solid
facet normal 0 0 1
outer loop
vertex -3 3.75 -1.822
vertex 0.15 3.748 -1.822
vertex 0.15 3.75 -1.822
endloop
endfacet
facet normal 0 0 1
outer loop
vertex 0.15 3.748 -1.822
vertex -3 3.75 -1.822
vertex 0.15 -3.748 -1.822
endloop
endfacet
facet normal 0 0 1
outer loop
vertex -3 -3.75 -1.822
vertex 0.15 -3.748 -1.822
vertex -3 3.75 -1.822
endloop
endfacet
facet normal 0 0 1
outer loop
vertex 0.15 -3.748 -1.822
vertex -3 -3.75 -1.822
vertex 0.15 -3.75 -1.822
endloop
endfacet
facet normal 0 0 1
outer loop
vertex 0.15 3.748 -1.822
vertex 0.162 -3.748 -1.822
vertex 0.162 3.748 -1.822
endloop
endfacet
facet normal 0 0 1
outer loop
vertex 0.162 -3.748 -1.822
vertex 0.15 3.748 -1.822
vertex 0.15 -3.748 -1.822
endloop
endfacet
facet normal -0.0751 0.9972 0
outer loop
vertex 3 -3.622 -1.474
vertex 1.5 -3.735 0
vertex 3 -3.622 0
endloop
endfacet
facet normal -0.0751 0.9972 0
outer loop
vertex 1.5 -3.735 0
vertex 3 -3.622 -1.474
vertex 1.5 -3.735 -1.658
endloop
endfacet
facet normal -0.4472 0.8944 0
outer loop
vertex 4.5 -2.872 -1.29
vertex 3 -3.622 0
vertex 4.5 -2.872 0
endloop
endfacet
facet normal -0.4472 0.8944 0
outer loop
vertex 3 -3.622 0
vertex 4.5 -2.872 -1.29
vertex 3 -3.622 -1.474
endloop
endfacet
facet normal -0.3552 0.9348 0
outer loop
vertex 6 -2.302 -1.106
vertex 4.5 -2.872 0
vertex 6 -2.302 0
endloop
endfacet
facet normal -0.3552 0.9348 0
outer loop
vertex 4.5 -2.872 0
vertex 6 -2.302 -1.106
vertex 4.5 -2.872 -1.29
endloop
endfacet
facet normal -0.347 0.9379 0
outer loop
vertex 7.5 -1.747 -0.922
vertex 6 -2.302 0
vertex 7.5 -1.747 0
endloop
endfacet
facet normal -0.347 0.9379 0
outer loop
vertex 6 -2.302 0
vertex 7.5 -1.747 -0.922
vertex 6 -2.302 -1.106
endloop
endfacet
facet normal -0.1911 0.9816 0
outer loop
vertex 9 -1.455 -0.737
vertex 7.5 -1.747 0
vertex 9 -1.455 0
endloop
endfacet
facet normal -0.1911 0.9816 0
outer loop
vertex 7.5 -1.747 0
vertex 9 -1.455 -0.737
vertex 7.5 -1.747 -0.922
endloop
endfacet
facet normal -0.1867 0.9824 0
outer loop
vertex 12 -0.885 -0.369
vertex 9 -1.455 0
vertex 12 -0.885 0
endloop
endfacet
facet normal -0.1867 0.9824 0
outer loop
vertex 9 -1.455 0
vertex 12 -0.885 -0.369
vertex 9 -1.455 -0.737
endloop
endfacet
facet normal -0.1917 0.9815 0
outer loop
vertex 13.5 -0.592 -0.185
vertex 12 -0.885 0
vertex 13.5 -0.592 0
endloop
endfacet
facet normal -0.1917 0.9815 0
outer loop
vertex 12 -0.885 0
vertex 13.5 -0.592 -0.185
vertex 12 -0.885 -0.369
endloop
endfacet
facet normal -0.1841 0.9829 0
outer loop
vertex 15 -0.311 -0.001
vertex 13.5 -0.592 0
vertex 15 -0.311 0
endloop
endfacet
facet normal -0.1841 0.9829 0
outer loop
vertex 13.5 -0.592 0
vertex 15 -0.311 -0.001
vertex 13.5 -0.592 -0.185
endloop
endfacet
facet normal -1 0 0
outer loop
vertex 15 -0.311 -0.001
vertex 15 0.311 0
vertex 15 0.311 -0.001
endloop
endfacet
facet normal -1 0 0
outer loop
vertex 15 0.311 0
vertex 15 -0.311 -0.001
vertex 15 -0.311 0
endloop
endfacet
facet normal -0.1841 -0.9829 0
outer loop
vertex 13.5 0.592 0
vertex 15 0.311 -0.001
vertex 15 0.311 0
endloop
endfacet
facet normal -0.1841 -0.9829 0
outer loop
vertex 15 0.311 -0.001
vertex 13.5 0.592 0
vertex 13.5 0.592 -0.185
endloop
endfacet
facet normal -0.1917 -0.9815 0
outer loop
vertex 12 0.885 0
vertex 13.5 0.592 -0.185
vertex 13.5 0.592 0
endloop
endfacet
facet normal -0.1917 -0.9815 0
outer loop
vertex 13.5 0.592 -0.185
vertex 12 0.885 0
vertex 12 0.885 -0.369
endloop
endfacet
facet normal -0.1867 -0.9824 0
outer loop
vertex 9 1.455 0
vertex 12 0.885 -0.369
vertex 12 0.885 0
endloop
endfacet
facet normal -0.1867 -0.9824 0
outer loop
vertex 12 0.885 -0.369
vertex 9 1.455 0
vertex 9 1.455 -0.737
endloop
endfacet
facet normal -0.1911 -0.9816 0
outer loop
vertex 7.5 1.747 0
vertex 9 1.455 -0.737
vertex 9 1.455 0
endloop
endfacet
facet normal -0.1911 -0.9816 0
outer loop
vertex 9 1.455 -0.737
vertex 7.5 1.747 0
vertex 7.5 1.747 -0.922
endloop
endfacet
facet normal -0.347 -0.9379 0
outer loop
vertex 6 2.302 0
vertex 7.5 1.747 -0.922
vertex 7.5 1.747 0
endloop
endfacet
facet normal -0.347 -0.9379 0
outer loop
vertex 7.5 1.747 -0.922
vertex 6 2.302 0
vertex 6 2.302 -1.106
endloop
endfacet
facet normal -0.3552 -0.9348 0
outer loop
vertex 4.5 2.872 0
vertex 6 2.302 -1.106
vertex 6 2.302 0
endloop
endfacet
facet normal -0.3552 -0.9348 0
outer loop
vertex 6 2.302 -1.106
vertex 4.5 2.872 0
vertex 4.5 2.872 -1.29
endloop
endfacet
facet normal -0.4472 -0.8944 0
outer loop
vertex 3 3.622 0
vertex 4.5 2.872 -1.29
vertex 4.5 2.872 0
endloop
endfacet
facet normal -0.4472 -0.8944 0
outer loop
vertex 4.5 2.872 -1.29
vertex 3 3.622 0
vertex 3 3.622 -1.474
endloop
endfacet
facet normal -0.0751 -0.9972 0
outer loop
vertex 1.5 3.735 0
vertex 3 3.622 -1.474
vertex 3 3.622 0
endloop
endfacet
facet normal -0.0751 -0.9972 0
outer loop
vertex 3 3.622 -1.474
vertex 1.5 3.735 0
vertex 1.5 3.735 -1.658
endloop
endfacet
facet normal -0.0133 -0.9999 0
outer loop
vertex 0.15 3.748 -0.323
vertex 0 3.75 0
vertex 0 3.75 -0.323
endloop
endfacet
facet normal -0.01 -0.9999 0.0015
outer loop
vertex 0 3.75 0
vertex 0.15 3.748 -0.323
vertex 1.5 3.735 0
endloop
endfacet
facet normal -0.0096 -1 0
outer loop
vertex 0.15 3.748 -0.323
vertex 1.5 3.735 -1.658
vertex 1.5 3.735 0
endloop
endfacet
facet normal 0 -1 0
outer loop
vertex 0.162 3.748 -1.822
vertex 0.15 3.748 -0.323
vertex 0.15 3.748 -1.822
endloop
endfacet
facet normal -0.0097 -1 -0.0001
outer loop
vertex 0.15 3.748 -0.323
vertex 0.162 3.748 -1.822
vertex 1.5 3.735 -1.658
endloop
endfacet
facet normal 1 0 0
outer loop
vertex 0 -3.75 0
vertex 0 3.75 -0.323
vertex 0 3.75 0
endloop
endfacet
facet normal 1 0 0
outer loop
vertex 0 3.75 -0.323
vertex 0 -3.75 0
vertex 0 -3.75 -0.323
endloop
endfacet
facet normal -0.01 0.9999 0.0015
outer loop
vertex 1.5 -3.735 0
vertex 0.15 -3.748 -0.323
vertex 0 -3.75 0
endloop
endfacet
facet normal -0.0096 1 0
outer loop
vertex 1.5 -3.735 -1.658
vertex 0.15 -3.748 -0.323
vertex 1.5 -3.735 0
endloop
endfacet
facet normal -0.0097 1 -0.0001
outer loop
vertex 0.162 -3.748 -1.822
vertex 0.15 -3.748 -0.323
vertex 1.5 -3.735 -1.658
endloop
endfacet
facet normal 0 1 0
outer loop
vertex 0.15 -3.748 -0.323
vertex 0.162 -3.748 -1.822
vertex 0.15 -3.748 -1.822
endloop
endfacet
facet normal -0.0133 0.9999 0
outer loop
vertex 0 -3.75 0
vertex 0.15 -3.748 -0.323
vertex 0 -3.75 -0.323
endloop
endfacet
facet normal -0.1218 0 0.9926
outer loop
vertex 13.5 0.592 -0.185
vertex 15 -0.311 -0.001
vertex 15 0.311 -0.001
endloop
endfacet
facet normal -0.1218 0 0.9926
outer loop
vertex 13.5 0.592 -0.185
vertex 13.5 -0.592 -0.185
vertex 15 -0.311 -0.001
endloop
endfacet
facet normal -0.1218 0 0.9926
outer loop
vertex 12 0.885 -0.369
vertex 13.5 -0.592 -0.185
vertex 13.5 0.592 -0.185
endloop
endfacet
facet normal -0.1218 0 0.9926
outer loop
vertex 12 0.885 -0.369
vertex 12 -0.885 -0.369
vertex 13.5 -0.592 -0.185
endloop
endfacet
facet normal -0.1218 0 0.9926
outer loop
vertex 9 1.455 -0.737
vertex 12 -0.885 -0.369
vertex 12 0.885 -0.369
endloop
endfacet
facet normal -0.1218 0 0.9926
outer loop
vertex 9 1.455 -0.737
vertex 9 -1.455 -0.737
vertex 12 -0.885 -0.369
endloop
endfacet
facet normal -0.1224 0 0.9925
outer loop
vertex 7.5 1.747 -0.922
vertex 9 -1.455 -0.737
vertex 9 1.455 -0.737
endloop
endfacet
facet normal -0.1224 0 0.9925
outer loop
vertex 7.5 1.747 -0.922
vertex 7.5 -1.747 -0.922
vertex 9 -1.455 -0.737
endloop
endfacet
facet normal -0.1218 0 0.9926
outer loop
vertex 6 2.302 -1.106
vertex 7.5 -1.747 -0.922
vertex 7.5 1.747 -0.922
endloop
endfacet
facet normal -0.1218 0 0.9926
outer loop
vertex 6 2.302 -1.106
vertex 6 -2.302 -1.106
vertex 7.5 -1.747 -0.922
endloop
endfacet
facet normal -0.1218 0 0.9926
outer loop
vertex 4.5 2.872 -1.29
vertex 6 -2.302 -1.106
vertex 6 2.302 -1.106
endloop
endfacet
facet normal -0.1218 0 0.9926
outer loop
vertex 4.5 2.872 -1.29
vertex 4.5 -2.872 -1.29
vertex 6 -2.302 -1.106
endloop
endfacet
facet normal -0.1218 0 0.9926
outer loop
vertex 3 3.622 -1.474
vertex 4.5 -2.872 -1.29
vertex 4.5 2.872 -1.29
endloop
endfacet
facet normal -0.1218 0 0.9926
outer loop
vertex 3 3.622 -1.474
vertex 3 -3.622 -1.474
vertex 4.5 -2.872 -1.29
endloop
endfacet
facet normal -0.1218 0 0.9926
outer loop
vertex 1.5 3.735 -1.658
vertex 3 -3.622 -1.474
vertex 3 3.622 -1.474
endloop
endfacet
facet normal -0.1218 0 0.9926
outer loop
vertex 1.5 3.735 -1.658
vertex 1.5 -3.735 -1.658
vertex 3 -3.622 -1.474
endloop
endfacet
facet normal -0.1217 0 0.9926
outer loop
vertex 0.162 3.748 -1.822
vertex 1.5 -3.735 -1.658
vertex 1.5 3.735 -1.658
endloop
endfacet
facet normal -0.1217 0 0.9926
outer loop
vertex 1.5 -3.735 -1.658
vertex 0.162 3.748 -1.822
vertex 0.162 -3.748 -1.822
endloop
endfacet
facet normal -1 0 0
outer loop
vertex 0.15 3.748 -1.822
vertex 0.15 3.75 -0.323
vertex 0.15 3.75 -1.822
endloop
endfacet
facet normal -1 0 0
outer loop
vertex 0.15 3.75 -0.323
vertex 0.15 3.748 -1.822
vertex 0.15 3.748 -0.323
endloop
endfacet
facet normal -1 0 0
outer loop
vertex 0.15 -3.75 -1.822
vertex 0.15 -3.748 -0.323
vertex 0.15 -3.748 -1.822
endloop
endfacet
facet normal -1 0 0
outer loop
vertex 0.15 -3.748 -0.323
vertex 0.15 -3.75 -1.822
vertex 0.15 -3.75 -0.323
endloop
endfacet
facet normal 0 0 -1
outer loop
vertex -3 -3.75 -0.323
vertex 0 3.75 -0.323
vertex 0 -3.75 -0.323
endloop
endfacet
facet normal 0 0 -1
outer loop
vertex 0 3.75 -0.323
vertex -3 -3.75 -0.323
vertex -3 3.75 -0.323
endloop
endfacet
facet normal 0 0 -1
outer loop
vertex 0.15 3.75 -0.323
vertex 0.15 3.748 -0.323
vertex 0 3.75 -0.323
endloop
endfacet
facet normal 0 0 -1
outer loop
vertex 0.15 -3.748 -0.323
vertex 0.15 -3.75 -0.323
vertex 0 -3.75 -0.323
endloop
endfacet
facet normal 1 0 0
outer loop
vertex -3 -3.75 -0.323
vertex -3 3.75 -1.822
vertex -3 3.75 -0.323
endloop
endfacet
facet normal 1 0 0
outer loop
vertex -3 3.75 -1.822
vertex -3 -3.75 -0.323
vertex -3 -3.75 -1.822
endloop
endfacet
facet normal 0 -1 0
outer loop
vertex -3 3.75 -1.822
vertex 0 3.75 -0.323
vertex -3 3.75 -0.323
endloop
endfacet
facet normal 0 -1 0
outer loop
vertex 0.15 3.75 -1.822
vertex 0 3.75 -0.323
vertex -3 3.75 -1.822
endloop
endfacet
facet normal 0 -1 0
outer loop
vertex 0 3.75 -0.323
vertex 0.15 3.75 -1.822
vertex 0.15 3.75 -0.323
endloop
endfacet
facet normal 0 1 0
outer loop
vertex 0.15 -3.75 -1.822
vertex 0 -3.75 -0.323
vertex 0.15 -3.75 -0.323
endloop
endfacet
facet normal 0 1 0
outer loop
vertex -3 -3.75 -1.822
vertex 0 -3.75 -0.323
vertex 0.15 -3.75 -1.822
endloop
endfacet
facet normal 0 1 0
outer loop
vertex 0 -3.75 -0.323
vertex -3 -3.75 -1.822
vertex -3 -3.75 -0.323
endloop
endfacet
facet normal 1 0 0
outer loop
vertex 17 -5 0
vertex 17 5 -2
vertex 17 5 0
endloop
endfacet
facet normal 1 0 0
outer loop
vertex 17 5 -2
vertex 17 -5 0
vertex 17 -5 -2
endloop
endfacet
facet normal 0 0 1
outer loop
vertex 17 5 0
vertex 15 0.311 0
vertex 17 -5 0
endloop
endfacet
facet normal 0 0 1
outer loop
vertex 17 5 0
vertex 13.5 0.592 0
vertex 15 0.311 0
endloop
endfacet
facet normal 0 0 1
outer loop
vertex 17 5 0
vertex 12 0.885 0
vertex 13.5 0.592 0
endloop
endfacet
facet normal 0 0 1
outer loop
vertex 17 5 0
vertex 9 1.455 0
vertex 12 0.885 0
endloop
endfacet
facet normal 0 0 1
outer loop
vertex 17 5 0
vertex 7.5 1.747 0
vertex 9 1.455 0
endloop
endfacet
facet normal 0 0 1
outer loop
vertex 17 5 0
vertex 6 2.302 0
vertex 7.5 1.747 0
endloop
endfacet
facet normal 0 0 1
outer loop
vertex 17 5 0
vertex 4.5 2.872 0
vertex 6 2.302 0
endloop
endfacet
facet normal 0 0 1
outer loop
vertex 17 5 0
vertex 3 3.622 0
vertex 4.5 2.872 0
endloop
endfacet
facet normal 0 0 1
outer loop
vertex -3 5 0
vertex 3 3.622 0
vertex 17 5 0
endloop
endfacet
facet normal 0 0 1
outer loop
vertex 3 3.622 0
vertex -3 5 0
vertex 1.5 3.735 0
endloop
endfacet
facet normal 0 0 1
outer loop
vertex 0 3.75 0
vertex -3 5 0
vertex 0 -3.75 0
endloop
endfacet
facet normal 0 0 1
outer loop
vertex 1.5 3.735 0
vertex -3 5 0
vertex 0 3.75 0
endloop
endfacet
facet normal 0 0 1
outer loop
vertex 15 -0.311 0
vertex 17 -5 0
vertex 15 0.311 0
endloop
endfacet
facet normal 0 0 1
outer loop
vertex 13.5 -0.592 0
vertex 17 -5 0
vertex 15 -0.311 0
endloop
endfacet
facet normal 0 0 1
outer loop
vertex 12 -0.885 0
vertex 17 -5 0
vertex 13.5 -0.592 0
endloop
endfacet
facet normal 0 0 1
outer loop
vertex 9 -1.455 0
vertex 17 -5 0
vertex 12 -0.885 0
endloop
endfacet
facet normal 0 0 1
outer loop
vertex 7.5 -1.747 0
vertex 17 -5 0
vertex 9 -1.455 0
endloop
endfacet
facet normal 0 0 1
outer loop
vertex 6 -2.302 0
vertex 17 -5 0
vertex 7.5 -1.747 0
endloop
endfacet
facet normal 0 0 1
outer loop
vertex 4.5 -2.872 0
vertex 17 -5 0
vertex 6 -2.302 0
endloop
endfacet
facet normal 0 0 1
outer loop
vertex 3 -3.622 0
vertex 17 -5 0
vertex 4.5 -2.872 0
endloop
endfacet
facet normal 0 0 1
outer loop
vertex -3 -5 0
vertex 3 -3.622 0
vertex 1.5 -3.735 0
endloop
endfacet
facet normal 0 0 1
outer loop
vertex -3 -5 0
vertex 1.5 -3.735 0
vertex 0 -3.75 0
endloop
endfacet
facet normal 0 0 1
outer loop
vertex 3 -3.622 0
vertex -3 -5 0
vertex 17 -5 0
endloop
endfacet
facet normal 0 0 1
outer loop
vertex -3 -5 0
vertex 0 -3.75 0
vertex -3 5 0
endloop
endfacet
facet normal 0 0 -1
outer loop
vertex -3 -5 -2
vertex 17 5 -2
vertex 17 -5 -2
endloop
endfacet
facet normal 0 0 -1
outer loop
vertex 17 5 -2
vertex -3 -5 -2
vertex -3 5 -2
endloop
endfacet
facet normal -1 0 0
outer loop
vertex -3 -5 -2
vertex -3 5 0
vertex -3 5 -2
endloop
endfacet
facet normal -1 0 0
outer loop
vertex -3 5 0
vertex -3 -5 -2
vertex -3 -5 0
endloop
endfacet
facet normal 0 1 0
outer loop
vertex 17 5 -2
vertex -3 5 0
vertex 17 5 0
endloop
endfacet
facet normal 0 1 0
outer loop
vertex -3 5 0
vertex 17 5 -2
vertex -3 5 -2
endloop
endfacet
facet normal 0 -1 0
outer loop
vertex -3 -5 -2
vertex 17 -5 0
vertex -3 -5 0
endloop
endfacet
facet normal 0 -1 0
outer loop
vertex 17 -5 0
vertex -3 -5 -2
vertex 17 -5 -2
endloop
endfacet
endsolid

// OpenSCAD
$fn=100;

module nacaduct_cutout(aspect){
  width  = 0.1 * aspect /2 ;
  translate([0,0,-.1215]){
    difference(){
      translate([0,0,-0.0]) linear_extrude(0.122) 
        polygon(points = [ 
          [0,width], 
          [0.1, width-width*0.004], 
          [0.2, width-width*0.034], 
          [0.3, width-width*0.234], 
          [0.4, width-width*0.386], 
          [0.5, width-width*0.534], 
          [0.6, width-width*0.612], 
          [0.7, width-width*0.688], 
          [0.8, width-width*0.764], 
          [0.9, width-width*0.842], 
          [1.0, width-width*0.917],
          [1.0, -width+width*0.917], 
          [0.9,-width+width*0.842], 
          [0.8, -width+width*0.764], 
          [0.7,-width+width*0.688], 
          [0.6, -width+width*0.612], 
          [0.5,-width+width*0.534], 
          [0.4, -width+width*0.386], 
          [0.3, -width+width*0.234], 
          [0.2, -width+width*0.034],
          [0.1, -width+width*0.004], 
          [0,-width]]);
      translate([0.02,-width,-0.15])
        rotate([0,-7,0])
          cube([1.5,width*2,0.15]);
      }
    translate([-0.2,-width,0])cube([0.21,width*2,0.1]);
    }
}


difference(){
   translate([-3,-5,-2]) cube([20,10,2]);
   scale(15) nacaduct_cutout(5);
}
